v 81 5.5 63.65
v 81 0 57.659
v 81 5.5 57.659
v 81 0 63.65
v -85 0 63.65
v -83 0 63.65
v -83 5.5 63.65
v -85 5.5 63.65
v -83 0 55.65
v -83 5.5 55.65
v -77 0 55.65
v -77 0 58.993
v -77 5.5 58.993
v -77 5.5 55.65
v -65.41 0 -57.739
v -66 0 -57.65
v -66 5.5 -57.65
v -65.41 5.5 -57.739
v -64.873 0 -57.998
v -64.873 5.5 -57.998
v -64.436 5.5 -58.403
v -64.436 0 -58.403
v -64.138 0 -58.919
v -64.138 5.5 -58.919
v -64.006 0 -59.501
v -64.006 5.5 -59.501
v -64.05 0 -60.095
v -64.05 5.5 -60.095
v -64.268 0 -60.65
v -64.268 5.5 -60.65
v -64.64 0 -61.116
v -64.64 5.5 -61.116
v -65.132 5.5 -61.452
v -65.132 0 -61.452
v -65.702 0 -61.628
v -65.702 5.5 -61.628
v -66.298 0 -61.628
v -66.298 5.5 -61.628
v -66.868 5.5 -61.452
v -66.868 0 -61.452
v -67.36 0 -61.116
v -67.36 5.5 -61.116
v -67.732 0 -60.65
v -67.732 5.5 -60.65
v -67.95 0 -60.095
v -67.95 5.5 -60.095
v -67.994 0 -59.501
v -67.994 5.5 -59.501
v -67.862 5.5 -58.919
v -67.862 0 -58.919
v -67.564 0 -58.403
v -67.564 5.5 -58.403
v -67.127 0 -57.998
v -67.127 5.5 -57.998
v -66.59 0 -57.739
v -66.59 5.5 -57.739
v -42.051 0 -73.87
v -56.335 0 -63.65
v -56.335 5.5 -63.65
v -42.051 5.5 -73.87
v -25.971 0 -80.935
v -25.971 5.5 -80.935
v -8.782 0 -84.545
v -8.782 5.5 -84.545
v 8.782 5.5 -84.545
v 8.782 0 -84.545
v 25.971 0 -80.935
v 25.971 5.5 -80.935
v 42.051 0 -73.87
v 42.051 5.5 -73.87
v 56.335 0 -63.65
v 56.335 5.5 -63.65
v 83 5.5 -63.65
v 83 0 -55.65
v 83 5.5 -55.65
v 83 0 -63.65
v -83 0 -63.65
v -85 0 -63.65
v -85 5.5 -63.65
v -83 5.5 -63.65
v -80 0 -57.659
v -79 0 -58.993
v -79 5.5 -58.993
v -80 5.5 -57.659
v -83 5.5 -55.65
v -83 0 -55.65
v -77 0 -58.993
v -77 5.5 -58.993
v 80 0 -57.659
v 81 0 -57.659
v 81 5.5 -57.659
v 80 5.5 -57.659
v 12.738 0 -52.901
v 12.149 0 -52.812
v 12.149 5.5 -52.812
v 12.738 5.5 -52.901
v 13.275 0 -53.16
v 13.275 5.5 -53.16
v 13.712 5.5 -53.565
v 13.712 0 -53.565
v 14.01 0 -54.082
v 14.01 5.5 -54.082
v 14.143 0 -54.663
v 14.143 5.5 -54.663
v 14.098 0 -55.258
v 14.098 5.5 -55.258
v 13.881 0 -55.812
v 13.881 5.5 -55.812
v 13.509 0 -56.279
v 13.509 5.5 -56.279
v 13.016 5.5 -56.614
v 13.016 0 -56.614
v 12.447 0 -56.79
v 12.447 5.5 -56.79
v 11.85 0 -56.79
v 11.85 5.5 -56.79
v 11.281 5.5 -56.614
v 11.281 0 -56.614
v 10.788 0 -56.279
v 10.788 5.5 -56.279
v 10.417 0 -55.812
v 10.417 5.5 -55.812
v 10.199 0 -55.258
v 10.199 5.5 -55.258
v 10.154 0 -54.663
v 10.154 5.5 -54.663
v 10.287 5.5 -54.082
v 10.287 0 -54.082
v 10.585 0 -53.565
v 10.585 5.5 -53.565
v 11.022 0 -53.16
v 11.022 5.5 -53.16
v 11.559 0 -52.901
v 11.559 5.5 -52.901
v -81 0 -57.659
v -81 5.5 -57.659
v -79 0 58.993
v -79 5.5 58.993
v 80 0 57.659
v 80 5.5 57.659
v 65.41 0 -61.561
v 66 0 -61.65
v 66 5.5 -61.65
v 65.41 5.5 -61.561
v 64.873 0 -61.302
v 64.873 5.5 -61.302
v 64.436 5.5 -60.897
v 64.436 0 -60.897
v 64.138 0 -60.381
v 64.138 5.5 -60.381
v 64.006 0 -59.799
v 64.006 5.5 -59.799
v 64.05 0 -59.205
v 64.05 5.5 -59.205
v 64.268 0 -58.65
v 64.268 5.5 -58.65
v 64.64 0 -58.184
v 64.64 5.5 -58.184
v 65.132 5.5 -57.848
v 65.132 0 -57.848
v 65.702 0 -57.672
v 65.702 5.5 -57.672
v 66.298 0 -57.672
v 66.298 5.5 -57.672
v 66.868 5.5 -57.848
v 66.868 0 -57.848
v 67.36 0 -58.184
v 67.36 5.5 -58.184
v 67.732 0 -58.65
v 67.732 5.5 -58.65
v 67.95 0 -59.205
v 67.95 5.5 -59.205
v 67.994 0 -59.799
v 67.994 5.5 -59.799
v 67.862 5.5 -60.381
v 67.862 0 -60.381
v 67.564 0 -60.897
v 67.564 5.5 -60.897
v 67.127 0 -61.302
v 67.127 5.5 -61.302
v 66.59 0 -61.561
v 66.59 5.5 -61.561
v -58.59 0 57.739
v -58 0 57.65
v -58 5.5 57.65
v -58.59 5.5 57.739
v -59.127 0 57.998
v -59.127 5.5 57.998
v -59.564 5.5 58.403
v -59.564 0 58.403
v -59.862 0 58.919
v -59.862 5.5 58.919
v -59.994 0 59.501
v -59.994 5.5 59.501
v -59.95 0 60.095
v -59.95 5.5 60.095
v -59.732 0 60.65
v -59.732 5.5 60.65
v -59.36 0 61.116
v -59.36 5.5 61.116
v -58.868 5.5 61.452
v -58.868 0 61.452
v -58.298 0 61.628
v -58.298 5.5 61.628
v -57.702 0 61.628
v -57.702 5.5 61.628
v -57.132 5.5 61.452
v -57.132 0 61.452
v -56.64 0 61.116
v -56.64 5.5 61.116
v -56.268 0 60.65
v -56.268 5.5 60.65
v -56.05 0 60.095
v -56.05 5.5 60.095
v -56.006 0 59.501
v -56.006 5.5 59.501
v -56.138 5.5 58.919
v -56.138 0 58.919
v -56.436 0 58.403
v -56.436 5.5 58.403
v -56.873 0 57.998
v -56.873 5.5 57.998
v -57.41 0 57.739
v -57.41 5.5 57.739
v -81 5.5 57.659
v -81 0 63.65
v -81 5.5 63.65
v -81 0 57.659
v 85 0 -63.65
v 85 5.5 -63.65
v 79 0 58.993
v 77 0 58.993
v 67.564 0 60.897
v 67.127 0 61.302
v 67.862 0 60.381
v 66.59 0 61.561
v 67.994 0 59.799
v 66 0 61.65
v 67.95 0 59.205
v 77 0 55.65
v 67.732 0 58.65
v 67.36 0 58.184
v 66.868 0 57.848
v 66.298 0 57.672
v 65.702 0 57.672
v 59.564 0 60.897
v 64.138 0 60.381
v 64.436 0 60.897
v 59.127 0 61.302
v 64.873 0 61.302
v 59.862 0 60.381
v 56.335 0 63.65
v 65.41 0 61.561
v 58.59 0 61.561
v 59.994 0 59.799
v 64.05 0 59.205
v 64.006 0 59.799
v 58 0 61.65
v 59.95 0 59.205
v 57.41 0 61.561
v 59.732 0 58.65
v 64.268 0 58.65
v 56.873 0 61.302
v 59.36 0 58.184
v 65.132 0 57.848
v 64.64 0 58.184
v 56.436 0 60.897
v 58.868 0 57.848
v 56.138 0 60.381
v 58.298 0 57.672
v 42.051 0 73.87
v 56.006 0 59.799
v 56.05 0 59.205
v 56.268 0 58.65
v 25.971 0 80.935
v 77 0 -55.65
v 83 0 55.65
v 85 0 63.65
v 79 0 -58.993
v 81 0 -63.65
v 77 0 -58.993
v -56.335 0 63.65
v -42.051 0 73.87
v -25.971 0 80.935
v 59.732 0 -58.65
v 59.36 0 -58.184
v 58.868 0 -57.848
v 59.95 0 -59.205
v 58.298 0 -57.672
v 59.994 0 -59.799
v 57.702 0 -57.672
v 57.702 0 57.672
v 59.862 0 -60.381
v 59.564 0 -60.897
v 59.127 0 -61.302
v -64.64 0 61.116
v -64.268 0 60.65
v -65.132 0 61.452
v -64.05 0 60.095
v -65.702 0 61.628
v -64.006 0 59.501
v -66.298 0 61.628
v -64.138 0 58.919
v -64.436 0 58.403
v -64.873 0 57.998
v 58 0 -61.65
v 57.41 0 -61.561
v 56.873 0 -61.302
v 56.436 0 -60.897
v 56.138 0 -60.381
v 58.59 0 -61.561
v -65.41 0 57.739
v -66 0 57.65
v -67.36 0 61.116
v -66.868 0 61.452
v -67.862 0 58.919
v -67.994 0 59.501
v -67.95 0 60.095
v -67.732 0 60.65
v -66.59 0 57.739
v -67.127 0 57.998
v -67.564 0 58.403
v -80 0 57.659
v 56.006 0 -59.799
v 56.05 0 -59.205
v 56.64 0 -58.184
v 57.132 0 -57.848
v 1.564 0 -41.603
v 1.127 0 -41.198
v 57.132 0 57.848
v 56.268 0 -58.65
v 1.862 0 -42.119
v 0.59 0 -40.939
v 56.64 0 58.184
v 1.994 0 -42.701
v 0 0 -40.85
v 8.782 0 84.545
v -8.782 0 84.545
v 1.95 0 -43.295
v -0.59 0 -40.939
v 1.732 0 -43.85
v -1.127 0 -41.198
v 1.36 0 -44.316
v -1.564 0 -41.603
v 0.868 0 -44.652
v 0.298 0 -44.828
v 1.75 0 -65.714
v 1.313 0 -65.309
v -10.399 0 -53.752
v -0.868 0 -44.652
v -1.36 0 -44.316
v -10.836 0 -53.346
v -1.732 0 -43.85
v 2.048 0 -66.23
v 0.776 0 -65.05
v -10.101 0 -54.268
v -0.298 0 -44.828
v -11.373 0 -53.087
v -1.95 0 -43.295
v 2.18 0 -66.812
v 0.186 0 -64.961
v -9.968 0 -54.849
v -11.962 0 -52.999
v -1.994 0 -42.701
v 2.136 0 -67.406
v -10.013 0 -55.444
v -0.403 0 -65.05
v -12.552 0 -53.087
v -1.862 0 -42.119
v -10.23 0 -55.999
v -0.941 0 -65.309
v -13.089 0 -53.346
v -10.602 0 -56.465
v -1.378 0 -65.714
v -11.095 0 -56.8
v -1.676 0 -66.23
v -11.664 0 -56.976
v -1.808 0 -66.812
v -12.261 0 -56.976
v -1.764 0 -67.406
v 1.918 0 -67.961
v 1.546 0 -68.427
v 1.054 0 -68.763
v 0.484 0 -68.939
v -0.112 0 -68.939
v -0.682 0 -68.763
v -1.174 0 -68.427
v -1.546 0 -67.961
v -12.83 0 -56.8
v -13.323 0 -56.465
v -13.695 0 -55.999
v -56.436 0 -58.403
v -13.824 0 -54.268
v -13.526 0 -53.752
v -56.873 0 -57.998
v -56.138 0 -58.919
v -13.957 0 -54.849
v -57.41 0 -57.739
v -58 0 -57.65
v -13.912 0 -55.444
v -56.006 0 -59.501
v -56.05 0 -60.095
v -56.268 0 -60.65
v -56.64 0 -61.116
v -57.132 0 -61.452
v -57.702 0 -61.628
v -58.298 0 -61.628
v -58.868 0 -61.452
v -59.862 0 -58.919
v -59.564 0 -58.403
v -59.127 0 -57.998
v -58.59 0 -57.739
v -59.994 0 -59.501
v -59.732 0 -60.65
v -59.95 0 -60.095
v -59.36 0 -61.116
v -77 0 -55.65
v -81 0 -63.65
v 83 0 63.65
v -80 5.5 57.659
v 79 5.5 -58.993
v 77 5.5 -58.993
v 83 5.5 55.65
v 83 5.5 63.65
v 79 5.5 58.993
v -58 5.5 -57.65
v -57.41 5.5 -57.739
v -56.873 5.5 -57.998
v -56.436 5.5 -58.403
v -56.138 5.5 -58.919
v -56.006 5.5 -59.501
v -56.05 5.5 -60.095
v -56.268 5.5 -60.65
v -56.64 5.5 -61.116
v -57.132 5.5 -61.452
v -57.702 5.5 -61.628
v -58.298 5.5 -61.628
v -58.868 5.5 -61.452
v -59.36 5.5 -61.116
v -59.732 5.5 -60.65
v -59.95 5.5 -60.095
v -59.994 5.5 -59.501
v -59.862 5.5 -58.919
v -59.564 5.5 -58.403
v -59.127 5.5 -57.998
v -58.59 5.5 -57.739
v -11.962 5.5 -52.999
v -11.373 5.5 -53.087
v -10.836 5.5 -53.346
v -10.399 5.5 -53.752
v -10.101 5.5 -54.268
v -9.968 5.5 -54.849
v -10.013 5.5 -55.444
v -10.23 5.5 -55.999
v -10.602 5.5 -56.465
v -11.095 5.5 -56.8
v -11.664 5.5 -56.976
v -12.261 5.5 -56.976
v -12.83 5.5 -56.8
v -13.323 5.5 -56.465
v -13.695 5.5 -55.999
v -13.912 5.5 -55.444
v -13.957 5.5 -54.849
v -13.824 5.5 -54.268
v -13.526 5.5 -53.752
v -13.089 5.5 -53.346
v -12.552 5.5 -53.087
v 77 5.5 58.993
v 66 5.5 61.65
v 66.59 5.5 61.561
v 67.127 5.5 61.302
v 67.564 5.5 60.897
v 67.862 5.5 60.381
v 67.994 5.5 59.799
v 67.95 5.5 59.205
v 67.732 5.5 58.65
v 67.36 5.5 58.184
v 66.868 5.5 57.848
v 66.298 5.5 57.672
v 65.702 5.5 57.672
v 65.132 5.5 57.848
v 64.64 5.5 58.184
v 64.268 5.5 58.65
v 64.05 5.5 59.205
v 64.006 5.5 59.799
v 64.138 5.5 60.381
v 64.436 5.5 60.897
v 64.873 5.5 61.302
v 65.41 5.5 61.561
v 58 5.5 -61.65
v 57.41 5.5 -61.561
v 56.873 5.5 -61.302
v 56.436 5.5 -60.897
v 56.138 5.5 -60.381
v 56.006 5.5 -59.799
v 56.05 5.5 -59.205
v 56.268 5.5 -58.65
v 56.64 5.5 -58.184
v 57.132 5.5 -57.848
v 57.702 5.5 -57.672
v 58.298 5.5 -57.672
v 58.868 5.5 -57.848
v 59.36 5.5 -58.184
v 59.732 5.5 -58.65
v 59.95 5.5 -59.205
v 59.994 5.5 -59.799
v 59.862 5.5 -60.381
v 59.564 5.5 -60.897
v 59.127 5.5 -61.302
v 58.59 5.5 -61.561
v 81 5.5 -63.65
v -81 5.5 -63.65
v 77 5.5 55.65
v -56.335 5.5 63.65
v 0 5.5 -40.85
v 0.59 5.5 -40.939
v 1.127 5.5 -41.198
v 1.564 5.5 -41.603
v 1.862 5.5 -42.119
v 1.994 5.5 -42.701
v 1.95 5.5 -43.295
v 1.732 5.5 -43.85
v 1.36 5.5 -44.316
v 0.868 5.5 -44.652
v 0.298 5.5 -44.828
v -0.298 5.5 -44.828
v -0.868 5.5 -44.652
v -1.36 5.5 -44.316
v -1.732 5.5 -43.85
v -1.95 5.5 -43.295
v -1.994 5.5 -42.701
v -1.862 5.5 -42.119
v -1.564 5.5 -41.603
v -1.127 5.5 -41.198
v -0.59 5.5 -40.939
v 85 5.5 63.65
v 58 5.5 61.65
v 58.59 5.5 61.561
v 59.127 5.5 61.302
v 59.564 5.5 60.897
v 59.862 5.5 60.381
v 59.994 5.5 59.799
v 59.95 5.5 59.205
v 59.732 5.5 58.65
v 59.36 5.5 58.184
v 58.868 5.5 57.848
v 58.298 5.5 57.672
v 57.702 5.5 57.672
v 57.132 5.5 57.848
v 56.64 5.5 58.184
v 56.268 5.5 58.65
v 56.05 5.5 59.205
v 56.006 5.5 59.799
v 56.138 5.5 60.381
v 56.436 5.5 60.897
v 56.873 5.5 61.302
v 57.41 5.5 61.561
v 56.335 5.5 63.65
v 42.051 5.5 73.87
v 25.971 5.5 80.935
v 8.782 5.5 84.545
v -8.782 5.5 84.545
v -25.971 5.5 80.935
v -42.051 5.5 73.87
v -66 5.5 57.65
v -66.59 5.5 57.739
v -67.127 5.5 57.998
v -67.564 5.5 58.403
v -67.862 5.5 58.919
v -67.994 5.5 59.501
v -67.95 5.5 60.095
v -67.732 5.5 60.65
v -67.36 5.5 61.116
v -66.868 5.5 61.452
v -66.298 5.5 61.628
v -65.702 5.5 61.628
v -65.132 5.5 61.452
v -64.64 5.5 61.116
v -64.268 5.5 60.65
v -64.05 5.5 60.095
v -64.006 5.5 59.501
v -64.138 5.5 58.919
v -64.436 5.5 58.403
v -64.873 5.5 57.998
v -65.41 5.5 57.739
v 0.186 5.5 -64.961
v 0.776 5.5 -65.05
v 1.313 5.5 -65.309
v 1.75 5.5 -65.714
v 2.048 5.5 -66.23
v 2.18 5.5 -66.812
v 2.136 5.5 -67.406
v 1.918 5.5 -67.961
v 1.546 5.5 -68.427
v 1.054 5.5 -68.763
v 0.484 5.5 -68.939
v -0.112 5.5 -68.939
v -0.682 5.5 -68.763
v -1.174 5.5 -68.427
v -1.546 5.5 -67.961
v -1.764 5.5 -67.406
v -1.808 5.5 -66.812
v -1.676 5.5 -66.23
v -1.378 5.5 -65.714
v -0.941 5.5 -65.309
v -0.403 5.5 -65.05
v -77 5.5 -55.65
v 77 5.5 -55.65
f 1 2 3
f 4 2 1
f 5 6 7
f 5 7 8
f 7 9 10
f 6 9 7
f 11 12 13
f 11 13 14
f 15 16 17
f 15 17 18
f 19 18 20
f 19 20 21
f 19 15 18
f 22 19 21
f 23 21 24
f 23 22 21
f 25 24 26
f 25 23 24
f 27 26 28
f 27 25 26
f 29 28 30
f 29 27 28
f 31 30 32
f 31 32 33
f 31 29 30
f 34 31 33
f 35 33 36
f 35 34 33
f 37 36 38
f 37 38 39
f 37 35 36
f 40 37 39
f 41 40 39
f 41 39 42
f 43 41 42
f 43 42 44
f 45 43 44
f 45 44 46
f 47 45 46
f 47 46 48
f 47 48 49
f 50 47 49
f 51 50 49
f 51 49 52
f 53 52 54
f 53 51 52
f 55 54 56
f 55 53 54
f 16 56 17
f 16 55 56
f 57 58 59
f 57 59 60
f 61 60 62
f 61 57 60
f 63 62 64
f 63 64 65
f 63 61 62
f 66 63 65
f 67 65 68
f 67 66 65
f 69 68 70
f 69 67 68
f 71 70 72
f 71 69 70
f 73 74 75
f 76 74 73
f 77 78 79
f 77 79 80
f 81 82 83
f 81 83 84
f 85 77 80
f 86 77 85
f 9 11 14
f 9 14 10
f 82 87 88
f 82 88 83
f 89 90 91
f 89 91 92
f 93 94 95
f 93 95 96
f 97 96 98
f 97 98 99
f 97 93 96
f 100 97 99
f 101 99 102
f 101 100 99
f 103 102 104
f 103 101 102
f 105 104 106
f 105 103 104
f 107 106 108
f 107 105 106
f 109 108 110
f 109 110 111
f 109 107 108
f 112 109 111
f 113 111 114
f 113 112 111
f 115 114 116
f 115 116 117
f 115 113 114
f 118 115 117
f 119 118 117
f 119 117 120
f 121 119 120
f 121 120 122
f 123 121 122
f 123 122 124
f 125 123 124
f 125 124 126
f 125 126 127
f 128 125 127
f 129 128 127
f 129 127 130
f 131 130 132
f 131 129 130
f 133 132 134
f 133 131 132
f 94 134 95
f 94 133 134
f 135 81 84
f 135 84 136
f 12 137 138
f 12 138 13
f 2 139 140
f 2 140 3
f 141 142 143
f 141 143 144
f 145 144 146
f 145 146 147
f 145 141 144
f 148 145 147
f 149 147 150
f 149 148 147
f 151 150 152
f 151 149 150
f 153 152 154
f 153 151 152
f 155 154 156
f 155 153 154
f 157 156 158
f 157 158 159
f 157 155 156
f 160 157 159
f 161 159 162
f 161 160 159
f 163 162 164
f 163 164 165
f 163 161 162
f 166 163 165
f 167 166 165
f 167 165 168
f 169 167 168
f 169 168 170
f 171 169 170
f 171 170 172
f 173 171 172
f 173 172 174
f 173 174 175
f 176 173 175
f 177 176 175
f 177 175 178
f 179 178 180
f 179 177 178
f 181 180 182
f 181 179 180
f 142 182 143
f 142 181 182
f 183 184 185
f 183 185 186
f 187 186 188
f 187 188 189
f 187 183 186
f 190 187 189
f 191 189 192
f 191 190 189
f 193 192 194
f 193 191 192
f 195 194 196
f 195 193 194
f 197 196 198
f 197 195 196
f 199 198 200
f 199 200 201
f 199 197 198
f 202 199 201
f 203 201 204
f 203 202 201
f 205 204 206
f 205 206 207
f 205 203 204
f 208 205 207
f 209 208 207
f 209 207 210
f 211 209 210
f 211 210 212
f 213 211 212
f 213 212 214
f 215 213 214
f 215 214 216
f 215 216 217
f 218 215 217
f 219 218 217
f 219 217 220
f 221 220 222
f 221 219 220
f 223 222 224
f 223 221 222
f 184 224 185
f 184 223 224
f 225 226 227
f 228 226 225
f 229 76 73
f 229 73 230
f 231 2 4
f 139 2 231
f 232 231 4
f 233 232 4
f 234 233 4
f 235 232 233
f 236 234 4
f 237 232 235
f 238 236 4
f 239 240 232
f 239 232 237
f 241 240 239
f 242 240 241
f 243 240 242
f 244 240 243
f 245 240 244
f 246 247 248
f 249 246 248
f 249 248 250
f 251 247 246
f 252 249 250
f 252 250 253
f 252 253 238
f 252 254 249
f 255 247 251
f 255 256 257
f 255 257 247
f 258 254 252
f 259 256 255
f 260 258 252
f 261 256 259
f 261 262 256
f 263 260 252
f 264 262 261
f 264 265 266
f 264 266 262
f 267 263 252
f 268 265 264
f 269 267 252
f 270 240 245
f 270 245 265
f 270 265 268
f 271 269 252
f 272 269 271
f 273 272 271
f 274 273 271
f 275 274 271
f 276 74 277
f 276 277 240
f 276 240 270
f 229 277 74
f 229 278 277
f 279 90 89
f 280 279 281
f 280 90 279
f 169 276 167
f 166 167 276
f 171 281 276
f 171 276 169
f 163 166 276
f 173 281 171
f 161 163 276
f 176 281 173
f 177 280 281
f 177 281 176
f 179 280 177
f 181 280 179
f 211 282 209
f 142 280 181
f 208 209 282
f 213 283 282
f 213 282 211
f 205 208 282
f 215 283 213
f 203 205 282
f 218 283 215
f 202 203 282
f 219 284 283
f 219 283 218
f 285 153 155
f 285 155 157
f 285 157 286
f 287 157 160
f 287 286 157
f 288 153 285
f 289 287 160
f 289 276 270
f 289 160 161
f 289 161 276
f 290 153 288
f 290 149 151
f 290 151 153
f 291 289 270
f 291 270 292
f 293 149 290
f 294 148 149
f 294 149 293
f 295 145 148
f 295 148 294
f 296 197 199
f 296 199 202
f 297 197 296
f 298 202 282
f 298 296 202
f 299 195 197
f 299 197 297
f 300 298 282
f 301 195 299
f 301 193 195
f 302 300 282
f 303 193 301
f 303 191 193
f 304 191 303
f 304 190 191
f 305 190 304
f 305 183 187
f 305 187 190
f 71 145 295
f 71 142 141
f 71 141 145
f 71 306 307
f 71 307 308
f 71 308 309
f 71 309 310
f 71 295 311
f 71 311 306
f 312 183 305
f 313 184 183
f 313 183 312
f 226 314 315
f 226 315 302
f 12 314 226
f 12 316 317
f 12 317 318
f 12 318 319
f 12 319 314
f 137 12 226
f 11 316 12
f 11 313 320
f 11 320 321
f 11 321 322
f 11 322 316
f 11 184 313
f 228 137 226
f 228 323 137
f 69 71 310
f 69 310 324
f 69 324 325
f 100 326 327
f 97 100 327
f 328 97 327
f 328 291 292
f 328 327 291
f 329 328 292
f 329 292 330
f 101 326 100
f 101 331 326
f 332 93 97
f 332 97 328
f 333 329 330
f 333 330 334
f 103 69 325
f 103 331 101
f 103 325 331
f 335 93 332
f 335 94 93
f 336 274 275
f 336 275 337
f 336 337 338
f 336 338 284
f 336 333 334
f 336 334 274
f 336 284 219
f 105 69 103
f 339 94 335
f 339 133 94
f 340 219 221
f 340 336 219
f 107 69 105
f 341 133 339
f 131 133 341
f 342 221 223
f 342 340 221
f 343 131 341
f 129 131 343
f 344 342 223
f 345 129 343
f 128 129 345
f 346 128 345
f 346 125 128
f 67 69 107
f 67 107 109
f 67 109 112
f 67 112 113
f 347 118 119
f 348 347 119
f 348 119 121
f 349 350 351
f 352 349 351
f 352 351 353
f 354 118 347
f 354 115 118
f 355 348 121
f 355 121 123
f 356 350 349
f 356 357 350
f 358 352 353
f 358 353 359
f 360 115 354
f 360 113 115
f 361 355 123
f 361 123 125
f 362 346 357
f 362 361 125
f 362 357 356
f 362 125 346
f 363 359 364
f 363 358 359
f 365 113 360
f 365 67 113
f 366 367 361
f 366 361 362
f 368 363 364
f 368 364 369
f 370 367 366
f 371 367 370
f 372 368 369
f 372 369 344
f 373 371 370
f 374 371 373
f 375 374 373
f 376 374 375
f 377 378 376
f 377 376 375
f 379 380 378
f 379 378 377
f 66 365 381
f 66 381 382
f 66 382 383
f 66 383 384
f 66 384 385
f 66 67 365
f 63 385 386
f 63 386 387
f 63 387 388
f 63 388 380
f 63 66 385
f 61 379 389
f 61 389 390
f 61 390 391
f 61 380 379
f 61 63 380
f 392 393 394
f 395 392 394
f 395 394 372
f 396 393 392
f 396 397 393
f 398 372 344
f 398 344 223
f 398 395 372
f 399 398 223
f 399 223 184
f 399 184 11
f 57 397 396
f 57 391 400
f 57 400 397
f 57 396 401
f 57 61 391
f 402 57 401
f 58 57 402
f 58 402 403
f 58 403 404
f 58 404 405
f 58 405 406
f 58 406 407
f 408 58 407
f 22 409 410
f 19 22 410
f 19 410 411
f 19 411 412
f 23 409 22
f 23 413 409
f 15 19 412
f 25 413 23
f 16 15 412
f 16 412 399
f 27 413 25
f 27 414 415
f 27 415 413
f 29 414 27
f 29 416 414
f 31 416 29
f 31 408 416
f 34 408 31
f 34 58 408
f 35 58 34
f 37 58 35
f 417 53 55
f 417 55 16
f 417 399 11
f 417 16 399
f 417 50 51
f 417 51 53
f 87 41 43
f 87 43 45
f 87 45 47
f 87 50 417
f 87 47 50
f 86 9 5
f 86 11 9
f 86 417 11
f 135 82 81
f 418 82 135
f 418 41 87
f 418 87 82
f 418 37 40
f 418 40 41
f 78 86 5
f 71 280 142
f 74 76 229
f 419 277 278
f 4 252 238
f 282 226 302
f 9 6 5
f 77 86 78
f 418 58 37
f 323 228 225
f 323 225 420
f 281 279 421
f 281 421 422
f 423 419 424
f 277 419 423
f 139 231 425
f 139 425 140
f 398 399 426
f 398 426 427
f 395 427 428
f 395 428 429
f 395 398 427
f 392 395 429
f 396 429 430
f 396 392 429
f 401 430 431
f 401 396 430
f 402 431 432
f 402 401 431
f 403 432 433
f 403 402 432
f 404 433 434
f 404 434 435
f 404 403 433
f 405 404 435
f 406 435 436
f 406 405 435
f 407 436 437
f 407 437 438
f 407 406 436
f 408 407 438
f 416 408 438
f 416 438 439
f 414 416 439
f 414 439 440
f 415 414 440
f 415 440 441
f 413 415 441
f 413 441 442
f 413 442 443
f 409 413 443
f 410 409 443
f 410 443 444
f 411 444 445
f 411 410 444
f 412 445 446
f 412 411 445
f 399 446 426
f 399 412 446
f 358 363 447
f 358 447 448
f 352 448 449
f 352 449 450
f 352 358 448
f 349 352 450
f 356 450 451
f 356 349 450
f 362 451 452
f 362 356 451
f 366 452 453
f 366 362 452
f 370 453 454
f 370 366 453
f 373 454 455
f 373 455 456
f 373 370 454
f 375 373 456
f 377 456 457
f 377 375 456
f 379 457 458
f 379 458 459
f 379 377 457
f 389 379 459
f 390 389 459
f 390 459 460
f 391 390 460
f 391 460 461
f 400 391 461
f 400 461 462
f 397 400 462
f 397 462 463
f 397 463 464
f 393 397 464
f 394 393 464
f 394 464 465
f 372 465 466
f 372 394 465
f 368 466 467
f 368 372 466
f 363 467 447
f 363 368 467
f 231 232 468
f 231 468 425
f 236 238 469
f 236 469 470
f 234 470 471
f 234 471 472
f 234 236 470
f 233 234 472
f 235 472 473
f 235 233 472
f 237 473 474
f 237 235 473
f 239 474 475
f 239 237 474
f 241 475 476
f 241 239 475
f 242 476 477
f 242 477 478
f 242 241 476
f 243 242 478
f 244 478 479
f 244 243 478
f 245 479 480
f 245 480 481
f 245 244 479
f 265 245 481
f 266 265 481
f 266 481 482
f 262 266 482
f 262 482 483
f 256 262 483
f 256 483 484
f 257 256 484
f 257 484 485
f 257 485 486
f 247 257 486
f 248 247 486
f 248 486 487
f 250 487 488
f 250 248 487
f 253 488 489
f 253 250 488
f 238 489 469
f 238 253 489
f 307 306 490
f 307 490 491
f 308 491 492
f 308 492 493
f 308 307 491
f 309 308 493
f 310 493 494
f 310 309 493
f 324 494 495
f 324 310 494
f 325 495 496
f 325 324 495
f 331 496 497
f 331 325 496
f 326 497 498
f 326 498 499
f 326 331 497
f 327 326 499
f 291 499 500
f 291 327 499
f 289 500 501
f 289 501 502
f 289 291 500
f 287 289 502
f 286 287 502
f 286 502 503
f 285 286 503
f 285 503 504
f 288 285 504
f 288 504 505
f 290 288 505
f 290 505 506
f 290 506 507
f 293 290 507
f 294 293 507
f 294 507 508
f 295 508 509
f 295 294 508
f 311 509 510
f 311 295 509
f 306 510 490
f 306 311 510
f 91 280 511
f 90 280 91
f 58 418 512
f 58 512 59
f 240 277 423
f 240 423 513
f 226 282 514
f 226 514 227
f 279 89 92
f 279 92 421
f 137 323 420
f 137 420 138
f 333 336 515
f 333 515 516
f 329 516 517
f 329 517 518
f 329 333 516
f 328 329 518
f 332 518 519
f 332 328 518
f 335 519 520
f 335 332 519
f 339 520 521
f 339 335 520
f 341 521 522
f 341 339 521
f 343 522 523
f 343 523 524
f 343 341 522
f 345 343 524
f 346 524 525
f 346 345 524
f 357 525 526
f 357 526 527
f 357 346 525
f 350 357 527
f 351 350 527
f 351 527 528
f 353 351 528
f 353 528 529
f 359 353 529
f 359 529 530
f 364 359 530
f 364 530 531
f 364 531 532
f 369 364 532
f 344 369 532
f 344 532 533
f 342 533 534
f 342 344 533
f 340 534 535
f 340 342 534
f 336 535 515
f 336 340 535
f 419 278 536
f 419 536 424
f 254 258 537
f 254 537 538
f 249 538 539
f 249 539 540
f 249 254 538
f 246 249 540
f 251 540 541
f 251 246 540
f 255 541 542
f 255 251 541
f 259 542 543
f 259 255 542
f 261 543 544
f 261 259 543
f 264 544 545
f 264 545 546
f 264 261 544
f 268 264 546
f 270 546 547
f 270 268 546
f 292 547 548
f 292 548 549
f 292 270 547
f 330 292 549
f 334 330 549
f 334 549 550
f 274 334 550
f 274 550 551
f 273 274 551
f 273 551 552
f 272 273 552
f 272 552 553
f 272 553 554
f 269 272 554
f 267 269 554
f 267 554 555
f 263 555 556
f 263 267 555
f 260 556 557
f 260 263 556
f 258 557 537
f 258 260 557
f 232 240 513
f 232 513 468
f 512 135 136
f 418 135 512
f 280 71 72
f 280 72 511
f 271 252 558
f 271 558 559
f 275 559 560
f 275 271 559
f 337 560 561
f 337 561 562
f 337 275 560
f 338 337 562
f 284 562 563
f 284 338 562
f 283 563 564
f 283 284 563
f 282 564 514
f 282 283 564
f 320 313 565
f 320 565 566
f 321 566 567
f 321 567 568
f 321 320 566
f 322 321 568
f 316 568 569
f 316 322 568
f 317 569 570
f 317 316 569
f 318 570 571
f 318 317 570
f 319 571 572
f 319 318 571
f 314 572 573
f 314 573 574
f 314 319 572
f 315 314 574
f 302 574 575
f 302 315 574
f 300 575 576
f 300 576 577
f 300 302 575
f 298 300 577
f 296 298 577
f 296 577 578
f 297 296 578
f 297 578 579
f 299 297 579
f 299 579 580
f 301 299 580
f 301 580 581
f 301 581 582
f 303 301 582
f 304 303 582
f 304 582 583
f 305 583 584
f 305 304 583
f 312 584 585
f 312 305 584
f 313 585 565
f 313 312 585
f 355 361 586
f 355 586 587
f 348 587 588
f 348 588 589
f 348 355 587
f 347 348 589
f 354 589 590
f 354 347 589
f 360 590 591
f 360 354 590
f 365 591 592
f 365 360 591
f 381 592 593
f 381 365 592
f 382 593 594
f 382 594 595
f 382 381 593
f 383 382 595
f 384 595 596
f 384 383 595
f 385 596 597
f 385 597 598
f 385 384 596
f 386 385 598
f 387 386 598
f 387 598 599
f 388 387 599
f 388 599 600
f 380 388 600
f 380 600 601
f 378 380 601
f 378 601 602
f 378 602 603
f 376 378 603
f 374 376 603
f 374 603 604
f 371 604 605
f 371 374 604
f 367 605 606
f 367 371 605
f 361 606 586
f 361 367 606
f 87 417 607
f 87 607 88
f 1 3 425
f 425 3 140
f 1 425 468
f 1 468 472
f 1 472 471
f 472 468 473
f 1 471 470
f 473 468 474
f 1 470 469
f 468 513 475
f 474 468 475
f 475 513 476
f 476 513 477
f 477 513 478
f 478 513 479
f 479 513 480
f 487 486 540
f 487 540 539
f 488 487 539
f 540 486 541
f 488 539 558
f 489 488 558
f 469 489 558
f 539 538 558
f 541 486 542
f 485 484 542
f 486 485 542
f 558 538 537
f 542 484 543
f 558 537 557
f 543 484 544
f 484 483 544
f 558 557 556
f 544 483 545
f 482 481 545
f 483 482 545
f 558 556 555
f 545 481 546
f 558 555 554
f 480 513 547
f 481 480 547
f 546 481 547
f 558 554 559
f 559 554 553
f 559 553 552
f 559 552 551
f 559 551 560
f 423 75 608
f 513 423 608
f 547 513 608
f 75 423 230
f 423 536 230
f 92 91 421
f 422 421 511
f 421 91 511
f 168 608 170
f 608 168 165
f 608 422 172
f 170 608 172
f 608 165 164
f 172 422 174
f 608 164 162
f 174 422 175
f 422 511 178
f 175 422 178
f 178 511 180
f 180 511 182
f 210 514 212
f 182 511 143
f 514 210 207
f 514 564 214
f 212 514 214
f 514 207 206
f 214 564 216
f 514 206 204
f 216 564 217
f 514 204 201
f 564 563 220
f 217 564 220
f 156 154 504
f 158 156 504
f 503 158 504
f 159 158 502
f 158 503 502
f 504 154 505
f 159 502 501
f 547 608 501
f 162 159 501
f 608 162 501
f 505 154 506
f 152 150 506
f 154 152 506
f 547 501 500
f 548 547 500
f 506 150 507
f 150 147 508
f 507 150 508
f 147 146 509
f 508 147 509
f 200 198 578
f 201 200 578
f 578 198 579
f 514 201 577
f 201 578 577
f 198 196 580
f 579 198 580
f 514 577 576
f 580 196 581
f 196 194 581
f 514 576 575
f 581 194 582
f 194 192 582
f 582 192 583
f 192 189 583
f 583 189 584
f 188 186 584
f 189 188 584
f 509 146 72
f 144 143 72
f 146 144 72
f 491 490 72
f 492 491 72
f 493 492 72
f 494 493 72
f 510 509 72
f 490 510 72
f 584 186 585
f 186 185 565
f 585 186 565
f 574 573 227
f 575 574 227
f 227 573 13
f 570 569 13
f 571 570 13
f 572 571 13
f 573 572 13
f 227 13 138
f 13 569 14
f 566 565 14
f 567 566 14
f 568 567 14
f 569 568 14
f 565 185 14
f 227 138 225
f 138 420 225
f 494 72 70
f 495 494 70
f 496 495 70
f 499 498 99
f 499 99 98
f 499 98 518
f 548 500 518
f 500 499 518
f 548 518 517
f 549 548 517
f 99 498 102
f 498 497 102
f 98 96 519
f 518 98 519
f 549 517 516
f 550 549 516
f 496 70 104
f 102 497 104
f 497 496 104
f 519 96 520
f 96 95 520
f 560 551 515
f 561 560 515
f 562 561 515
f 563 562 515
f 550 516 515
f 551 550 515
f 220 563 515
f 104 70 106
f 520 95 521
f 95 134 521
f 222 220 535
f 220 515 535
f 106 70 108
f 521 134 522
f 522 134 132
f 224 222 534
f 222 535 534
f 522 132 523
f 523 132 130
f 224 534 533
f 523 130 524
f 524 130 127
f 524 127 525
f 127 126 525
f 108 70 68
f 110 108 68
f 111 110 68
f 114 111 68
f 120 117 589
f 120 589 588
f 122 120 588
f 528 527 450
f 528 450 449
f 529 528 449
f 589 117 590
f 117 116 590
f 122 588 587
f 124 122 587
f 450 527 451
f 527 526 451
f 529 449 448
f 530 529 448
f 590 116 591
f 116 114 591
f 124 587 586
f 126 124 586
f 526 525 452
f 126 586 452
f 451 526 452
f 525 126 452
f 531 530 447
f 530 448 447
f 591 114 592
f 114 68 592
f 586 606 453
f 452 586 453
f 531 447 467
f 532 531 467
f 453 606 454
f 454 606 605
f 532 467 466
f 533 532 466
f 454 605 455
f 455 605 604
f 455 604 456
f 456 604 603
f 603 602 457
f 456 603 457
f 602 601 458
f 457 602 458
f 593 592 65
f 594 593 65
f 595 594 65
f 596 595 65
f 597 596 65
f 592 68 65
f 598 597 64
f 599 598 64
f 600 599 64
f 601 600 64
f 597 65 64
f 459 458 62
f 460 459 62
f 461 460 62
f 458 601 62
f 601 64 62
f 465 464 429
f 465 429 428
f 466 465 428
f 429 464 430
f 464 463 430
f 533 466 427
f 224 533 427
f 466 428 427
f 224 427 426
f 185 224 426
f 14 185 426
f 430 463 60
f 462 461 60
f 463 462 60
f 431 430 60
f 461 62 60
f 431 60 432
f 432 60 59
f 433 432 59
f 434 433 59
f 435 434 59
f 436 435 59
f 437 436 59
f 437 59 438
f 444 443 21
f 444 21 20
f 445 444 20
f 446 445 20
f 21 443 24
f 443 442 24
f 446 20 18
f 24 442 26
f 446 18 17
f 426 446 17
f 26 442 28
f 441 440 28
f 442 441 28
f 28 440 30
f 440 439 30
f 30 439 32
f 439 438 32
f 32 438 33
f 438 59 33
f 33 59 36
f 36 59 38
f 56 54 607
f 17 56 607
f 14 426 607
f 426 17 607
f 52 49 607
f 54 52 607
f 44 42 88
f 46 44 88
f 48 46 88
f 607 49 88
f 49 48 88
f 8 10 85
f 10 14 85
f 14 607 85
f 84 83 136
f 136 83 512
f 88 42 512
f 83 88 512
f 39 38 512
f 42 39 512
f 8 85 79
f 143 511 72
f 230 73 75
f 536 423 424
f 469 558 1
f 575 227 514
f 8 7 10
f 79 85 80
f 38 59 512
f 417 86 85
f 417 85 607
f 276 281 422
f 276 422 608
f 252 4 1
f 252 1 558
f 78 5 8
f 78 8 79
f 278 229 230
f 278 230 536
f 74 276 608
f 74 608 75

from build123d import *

# Parameters (mm, degrees)
SKETCH4_R           = 2
BOSS_EXTRUDE1_DEPTH = 5.5


with BuildPart() as part:
    # Sketch4 → Boss-Extrude1 (new body)
    with BuildSketch(Plane(origin=(0, 0, 0), x_dir=(1, 0, 0), z_dir=(0, 1, 0))):
        with BuildLine():
            Line((56.335401836, 63.65), (81, 63.65))
            Line((81, 63.65), (81, 57.659411765))
            Line((81, 57.659411765), (80, 57.659411765))
            Line((80, 57.659411765), (79, 58.992745098))
            Line((79, 58.992745098), (77, 58.992745098))
            Line((77, 58.992745098), (77, 55.65))
            Line((77, 55.65), (83, 55.65))
            Line((83, 55.65), (83, 63.65))
            Line((83, 63.65), (85, 63.65))
            Line((85, 63.65), (85, -63.65))
            Line((85, -63.65), (83, -63.65))
            Line((83, -63.65), (83, -55.65))
            Line((83, -55.65), (77, -55.65))
            Line((77, -55.65), (77, -58.992745098))
            Line((77, -58.992745098), (79, -58.992745098))
            Line((79, -58.992745098), (80, -57.659411765))
            Line((80, -57.659411765), (81, -57.659411765))
            Line((81, -57.659411765), (81, -63.65))
            Line((81, -63.65), (56.335401836, -63.65))
            ThreePointArc((56.335401836, -63.65), (0, -85), (-56.335401836, -63.65))
            Line((-56.335401836, -63.65), (-81, -63.65))
            Line((-81, -63.65), (-81, -57.659411765))
            Line((-81, -57.659411765), (-80, -57.659411765))
            Line((-80, -57.659411765), (-79, -58.992745098))
            Line((-79, -58.992745098), (-77, -58.992745098))
            Line((-77, -58.992745098), (-77, -55.65))
            Line((-77, -55.65), (-83, -55.65))
            Line((-83, -55.65), (-83, -63.65))
            Line((-83, -63.65), (-85, -63.65))
            Line((-85, -63.65), (-85, 63.65))
            Line((-85, 63.65), (-83, 63.65))
            Line((-83, 63.65), (-83, 55.65))
            Line((-83, 55.65), (-77, 55.65))
            Line((-77, 55.65), (-77, 58.992745098))
            Line((-77, 58.992745098), (-79, 58.992745098))
            Line((-79, 58.992745098), (-80, 57.659411765))
            Line((-80, 57.659411765), (-81, 57.659411765))
            Line((-81, 57.659411765), (-81, 63.65))
            Line((-81, 63.65), (-56.335401836, 63.65))
            ThreePointArc((-56.335401836, 63.65), (0, 85), (56.335401836, 63.65))
        make_face()
        with Locations(Location((-58, 59.65, 0), (0, 0, 270))):
            Circle(SKETCH4_R, mode=Mode.SUBTRACT)
        with Locations(Location((-66, 59.65, 0), (0, 0, 270))):
            Circle(SKETCH4_R, mode=Mode.SUBTRACT)
        with Locations(Location((66, 59.65, 0), (0, 0, 90))):
            Circle(SKETCH4_R, mode=Mode.SUBTRACT)
        with Locations(Location((58, 59.65, 0), (0, 0, 90))):
            Circle(SKETCH4_R, mode=Mode.SUBTRACT)
        with Locations(Location((66, -59.65, 0), (0, 0, 270))):
            Circle(SKETCH4_R, mode=Mode.SUBTRACT)
        with Locations(Location((58, -59.65, 0), (0, 0, 270))):
            Circle(SKETCH4_R, mode=Mode.SUBTRACT)
        with Locations(Location((-58, -59.65, 0), (0, 0, 90))):
            Circle(SKETCH4_R, mode=Mode.SUBTRACT)
        with Locations(Location((-66, -59.65, 0), (0, 0, 90))):
            Circle(SKETCH4_R, mode=Mode.SUBTRACT)
        with Locations(Location((12.148552835, 54.812479272, 0), (0, 0, 270))):
            Circle(SKETCH4_R, mode=Mode.SUBTRACT)
        with Locations(Location((0, 42.85, 0), (0, 0, 270))):
            Circle(SKETCH4_R, mode=Mode.SUBTRACT)
        with Locations(Location((-11.962479272, 54.998552835, 0), (0, 0, 270))):
            Circle(SKETCH4_R, mode=Mode.SUBTRACT)
        with Locations(Location((0.186073563, 66.961032106, 0), (0, 0, 270))):
            Circle(SKETCH4_R, mode=Mode.SUBTRACT)
    extrude(amount=BOSS_EXTRUDE1_DEPTH)


solid = part.part
